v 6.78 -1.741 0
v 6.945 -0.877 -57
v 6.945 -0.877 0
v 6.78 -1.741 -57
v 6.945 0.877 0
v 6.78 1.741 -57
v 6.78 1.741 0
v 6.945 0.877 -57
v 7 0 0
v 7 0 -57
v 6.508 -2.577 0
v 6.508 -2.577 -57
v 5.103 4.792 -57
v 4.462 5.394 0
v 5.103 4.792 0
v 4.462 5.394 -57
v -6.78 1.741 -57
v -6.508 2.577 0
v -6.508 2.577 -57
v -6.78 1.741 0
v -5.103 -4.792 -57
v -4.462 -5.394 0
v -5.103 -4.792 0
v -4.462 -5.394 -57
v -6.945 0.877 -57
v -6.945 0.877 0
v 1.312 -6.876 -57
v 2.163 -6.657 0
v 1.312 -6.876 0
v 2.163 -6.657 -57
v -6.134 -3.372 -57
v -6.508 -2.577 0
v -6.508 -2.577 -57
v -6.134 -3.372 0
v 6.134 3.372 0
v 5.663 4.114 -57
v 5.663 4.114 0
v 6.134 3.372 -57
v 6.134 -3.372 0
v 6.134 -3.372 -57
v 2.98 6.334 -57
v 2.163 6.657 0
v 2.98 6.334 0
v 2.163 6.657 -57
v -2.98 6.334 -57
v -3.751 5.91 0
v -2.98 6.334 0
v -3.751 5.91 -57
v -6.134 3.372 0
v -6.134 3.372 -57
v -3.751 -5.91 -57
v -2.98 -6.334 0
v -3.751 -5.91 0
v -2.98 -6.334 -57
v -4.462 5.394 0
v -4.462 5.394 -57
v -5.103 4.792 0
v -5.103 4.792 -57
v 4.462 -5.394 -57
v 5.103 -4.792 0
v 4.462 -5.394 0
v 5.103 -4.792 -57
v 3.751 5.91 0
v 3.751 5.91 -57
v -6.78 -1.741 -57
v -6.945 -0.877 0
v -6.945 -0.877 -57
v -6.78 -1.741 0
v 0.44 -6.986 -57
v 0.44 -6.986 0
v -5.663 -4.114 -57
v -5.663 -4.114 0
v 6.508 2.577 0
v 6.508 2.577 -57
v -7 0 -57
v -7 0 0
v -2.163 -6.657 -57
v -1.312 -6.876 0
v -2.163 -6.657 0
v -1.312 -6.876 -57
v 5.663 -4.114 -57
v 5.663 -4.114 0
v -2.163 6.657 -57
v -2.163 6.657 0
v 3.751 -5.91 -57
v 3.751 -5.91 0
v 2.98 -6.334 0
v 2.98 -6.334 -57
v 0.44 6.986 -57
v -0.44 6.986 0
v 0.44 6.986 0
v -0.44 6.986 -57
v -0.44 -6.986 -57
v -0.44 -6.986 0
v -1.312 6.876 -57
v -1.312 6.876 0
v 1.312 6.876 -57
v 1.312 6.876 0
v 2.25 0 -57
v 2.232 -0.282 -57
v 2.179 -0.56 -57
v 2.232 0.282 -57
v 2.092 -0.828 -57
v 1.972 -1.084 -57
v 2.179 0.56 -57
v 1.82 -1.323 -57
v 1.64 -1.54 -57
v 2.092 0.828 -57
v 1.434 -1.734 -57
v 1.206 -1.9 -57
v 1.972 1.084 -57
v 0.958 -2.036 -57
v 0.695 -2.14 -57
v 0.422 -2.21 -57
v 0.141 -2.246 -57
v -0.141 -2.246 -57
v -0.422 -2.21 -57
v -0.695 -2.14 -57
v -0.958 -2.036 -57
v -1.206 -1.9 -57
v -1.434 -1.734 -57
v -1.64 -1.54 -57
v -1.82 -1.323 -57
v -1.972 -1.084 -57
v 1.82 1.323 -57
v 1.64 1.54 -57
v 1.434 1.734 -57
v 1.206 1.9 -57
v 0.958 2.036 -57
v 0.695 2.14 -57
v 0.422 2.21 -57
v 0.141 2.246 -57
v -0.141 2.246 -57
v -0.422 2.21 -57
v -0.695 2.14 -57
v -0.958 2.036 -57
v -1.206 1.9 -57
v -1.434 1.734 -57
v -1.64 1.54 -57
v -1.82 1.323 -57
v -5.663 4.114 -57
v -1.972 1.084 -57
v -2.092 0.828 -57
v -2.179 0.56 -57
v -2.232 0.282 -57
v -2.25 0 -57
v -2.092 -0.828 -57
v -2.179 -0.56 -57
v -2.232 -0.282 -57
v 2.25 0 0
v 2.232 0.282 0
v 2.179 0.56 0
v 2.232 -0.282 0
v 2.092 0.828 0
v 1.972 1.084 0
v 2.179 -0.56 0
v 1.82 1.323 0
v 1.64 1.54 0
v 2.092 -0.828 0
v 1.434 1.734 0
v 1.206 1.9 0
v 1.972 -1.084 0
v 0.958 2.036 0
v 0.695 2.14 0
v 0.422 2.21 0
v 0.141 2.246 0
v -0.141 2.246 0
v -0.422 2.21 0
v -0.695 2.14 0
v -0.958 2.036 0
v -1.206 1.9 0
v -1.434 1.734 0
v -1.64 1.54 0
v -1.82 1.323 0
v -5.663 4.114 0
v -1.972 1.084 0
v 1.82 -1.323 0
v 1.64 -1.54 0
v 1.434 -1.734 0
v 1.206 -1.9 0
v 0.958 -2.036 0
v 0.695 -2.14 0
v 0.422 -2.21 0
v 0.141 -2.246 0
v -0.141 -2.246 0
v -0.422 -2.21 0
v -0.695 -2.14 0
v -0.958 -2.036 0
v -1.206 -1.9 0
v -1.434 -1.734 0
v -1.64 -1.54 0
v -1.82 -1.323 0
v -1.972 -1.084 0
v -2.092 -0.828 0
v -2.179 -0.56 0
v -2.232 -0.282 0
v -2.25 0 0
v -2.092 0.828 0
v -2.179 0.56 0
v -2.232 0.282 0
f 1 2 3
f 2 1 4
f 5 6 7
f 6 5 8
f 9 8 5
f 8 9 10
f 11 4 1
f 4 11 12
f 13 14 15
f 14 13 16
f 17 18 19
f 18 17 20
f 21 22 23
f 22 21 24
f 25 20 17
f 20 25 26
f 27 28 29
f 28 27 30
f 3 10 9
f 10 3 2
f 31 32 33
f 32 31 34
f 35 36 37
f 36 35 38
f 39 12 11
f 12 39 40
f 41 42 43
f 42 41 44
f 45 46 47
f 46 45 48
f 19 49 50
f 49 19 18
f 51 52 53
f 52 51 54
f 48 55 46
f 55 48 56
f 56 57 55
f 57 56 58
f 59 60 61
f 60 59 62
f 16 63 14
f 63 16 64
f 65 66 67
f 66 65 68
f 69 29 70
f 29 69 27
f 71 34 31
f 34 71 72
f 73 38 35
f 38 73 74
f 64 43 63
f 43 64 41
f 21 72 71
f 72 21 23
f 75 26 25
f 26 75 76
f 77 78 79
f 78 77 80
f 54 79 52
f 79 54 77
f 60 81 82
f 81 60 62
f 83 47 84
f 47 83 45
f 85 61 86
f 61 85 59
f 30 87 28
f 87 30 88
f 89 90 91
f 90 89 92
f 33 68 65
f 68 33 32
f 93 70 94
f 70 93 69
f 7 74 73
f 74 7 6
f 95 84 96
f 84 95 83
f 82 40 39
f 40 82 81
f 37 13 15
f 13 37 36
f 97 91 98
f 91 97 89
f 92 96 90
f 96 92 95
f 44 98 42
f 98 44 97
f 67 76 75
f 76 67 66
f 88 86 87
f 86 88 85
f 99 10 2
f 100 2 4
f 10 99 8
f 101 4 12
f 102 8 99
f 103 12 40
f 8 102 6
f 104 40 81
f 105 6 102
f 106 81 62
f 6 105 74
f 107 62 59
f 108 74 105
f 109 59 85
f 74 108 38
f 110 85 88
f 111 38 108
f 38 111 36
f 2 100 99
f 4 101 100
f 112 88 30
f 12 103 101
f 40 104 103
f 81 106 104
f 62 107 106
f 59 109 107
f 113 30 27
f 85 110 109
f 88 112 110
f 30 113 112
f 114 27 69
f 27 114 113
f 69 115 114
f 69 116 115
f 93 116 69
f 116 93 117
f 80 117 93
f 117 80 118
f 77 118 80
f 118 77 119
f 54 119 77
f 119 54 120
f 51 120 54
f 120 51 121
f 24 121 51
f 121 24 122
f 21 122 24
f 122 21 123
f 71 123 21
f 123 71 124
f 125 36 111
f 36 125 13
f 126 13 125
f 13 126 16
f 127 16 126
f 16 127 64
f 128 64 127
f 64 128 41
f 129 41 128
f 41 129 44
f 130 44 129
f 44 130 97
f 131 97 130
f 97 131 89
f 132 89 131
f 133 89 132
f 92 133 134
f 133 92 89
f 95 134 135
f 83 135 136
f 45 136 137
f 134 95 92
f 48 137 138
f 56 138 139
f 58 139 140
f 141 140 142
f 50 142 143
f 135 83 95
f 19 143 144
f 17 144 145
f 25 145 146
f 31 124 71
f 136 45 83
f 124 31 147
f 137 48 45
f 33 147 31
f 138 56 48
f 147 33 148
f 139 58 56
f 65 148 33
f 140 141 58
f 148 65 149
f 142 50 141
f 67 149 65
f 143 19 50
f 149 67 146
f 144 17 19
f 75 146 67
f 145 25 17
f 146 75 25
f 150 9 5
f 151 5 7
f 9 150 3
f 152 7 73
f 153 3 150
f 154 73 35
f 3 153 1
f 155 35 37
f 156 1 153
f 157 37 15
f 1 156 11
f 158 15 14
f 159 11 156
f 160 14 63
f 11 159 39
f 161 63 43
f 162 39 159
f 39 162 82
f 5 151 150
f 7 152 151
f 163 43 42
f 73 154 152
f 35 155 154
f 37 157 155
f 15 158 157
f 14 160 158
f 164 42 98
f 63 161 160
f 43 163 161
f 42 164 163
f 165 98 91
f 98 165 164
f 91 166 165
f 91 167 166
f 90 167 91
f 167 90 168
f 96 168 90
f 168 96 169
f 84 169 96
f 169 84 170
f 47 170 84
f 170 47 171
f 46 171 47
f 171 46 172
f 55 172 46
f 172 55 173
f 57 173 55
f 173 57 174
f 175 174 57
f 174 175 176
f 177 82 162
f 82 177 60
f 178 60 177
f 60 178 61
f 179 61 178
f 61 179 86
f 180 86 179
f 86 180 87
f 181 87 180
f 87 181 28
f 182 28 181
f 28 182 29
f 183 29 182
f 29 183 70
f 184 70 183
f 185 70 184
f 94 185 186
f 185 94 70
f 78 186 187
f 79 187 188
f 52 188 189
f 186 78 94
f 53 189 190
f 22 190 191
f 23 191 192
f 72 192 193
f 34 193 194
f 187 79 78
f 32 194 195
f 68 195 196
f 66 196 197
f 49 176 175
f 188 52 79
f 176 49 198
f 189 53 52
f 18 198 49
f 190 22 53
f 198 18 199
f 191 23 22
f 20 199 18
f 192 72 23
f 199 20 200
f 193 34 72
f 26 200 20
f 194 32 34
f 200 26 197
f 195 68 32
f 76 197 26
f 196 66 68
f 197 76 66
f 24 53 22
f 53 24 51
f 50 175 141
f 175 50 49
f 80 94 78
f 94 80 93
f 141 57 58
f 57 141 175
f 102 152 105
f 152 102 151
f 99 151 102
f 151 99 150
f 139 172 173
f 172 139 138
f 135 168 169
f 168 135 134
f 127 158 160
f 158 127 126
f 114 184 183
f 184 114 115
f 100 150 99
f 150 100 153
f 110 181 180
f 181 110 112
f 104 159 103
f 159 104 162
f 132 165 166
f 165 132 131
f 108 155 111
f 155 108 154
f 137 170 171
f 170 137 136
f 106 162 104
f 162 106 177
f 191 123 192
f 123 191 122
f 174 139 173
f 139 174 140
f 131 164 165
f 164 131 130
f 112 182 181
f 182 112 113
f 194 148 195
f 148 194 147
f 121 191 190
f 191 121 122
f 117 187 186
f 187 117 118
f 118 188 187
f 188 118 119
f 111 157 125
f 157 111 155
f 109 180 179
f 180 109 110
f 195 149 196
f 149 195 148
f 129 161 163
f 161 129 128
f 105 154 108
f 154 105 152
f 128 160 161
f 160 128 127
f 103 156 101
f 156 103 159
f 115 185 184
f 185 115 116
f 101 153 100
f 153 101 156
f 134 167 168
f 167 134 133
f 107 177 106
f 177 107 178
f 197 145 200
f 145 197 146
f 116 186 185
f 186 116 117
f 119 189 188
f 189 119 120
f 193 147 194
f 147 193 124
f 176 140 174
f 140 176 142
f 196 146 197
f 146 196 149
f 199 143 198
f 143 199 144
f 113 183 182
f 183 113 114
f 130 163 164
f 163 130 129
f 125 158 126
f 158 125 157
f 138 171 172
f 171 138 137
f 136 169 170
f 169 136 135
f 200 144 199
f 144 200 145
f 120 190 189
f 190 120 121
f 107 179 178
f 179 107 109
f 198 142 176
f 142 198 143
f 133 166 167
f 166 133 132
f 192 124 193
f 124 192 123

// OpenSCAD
$fn = 50;


difference() {
	union() {
		translate(v = [0, 0, -57.0000000000]) {
			cylinder(h = 57, r = 7.0000000000);
		}
		cylinder(h = 0, r = 16.0000000000);
	}
	union() {
		#translate(v = [0, 0, -57]) {
			cylinder(h = 57, r = 2.2500000000);
		}
	}
}
